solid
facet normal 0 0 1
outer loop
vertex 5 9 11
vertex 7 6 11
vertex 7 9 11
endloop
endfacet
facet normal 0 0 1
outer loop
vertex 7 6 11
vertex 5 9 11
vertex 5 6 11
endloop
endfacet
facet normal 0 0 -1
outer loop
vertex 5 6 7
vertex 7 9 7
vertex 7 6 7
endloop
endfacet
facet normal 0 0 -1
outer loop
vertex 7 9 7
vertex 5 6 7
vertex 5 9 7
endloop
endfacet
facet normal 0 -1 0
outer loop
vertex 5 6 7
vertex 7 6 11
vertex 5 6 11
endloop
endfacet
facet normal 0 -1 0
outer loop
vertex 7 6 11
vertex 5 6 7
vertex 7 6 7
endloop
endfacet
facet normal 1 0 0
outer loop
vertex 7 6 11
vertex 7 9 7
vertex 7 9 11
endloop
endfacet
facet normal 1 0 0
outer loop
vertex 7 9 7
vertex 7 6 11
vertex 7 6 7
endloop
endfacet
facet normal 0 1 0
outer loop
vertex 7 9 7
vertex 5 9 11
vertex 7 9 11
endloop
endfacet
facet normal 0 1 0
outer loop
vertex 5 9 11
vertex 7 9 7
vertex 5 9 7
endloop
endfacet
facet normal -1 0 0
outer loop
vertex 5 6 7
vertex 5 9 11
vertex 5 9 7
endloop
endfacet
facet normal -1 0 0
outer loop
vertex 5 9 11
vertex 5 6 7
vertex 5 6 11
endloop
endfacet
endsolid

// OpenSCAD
use <../openscad/transform.scad>

test_transform = "move"; // [move,xmove,ymove,zmove,flip,xflip,yflip,zflip,rot,xrot,yrot,zrot,object,frame,frame-object]

module fixture() {
    cube([2, 3, 4]);
}

if (test_transform == "move")
    fg_xf_move([5, 6, 7])
        fixture();
else if (test_transform == "xmove")
    fg_xf_xmove(5)
        fixture();
else if (test_transform == "ymove")
    fg_xf_ymove(6)
        fixture();
else if (test_transform == "zmove")
    fg_xf_zmove(7)
        fixture();
else if (test_transform == "flip")
    fg_xf_flip([1, 1, 0])
        fixture();
else if (test_transform == "xflip")
    fg_xf_xflip()
        fixture();
else if (test_transform == "yflip")
    fg_xf_yflip()
        fixture();
else if (test_transform == "zflip")
    fg_xf_zflip()
        fixture();
else if (test_transform == "rot")
    fg_xf_rot([15, 25, 35])
        fixture();
else if (test_transform == "xrot")
    fg_xf_xrot(30)
        fixture();
else if (test_transform == "yrot")
    fg_xf_yrot(40)
        fixture();
else if (test_transform == "zrot")
    fg_xf_zrot(50)
        fixture();
else if (test_transform == "object")
    fg_xf_apply(
        fg_xf_create(
            pos_mm = [5, 6, 7],
            rot_deg = [15, 25, 35]
        )
    )
        fixture();
else if (test_transform == "frame")
    fg_xf_frame(
        pos_mm = [5, 6, 7],
        x_axis = [0, 1, 0],
        y_axis = [0, 0, 1]
    )
        fixture();
else if (test_transform == "frame-object")
    fg_xf_apply(
        fg_xf_frame_create(
            pos_mm = [5, 6, 7],
            x_axis = [0, 1, 0],
            y_axis = [0, 0, 1]
        )
    )
        fixture();
